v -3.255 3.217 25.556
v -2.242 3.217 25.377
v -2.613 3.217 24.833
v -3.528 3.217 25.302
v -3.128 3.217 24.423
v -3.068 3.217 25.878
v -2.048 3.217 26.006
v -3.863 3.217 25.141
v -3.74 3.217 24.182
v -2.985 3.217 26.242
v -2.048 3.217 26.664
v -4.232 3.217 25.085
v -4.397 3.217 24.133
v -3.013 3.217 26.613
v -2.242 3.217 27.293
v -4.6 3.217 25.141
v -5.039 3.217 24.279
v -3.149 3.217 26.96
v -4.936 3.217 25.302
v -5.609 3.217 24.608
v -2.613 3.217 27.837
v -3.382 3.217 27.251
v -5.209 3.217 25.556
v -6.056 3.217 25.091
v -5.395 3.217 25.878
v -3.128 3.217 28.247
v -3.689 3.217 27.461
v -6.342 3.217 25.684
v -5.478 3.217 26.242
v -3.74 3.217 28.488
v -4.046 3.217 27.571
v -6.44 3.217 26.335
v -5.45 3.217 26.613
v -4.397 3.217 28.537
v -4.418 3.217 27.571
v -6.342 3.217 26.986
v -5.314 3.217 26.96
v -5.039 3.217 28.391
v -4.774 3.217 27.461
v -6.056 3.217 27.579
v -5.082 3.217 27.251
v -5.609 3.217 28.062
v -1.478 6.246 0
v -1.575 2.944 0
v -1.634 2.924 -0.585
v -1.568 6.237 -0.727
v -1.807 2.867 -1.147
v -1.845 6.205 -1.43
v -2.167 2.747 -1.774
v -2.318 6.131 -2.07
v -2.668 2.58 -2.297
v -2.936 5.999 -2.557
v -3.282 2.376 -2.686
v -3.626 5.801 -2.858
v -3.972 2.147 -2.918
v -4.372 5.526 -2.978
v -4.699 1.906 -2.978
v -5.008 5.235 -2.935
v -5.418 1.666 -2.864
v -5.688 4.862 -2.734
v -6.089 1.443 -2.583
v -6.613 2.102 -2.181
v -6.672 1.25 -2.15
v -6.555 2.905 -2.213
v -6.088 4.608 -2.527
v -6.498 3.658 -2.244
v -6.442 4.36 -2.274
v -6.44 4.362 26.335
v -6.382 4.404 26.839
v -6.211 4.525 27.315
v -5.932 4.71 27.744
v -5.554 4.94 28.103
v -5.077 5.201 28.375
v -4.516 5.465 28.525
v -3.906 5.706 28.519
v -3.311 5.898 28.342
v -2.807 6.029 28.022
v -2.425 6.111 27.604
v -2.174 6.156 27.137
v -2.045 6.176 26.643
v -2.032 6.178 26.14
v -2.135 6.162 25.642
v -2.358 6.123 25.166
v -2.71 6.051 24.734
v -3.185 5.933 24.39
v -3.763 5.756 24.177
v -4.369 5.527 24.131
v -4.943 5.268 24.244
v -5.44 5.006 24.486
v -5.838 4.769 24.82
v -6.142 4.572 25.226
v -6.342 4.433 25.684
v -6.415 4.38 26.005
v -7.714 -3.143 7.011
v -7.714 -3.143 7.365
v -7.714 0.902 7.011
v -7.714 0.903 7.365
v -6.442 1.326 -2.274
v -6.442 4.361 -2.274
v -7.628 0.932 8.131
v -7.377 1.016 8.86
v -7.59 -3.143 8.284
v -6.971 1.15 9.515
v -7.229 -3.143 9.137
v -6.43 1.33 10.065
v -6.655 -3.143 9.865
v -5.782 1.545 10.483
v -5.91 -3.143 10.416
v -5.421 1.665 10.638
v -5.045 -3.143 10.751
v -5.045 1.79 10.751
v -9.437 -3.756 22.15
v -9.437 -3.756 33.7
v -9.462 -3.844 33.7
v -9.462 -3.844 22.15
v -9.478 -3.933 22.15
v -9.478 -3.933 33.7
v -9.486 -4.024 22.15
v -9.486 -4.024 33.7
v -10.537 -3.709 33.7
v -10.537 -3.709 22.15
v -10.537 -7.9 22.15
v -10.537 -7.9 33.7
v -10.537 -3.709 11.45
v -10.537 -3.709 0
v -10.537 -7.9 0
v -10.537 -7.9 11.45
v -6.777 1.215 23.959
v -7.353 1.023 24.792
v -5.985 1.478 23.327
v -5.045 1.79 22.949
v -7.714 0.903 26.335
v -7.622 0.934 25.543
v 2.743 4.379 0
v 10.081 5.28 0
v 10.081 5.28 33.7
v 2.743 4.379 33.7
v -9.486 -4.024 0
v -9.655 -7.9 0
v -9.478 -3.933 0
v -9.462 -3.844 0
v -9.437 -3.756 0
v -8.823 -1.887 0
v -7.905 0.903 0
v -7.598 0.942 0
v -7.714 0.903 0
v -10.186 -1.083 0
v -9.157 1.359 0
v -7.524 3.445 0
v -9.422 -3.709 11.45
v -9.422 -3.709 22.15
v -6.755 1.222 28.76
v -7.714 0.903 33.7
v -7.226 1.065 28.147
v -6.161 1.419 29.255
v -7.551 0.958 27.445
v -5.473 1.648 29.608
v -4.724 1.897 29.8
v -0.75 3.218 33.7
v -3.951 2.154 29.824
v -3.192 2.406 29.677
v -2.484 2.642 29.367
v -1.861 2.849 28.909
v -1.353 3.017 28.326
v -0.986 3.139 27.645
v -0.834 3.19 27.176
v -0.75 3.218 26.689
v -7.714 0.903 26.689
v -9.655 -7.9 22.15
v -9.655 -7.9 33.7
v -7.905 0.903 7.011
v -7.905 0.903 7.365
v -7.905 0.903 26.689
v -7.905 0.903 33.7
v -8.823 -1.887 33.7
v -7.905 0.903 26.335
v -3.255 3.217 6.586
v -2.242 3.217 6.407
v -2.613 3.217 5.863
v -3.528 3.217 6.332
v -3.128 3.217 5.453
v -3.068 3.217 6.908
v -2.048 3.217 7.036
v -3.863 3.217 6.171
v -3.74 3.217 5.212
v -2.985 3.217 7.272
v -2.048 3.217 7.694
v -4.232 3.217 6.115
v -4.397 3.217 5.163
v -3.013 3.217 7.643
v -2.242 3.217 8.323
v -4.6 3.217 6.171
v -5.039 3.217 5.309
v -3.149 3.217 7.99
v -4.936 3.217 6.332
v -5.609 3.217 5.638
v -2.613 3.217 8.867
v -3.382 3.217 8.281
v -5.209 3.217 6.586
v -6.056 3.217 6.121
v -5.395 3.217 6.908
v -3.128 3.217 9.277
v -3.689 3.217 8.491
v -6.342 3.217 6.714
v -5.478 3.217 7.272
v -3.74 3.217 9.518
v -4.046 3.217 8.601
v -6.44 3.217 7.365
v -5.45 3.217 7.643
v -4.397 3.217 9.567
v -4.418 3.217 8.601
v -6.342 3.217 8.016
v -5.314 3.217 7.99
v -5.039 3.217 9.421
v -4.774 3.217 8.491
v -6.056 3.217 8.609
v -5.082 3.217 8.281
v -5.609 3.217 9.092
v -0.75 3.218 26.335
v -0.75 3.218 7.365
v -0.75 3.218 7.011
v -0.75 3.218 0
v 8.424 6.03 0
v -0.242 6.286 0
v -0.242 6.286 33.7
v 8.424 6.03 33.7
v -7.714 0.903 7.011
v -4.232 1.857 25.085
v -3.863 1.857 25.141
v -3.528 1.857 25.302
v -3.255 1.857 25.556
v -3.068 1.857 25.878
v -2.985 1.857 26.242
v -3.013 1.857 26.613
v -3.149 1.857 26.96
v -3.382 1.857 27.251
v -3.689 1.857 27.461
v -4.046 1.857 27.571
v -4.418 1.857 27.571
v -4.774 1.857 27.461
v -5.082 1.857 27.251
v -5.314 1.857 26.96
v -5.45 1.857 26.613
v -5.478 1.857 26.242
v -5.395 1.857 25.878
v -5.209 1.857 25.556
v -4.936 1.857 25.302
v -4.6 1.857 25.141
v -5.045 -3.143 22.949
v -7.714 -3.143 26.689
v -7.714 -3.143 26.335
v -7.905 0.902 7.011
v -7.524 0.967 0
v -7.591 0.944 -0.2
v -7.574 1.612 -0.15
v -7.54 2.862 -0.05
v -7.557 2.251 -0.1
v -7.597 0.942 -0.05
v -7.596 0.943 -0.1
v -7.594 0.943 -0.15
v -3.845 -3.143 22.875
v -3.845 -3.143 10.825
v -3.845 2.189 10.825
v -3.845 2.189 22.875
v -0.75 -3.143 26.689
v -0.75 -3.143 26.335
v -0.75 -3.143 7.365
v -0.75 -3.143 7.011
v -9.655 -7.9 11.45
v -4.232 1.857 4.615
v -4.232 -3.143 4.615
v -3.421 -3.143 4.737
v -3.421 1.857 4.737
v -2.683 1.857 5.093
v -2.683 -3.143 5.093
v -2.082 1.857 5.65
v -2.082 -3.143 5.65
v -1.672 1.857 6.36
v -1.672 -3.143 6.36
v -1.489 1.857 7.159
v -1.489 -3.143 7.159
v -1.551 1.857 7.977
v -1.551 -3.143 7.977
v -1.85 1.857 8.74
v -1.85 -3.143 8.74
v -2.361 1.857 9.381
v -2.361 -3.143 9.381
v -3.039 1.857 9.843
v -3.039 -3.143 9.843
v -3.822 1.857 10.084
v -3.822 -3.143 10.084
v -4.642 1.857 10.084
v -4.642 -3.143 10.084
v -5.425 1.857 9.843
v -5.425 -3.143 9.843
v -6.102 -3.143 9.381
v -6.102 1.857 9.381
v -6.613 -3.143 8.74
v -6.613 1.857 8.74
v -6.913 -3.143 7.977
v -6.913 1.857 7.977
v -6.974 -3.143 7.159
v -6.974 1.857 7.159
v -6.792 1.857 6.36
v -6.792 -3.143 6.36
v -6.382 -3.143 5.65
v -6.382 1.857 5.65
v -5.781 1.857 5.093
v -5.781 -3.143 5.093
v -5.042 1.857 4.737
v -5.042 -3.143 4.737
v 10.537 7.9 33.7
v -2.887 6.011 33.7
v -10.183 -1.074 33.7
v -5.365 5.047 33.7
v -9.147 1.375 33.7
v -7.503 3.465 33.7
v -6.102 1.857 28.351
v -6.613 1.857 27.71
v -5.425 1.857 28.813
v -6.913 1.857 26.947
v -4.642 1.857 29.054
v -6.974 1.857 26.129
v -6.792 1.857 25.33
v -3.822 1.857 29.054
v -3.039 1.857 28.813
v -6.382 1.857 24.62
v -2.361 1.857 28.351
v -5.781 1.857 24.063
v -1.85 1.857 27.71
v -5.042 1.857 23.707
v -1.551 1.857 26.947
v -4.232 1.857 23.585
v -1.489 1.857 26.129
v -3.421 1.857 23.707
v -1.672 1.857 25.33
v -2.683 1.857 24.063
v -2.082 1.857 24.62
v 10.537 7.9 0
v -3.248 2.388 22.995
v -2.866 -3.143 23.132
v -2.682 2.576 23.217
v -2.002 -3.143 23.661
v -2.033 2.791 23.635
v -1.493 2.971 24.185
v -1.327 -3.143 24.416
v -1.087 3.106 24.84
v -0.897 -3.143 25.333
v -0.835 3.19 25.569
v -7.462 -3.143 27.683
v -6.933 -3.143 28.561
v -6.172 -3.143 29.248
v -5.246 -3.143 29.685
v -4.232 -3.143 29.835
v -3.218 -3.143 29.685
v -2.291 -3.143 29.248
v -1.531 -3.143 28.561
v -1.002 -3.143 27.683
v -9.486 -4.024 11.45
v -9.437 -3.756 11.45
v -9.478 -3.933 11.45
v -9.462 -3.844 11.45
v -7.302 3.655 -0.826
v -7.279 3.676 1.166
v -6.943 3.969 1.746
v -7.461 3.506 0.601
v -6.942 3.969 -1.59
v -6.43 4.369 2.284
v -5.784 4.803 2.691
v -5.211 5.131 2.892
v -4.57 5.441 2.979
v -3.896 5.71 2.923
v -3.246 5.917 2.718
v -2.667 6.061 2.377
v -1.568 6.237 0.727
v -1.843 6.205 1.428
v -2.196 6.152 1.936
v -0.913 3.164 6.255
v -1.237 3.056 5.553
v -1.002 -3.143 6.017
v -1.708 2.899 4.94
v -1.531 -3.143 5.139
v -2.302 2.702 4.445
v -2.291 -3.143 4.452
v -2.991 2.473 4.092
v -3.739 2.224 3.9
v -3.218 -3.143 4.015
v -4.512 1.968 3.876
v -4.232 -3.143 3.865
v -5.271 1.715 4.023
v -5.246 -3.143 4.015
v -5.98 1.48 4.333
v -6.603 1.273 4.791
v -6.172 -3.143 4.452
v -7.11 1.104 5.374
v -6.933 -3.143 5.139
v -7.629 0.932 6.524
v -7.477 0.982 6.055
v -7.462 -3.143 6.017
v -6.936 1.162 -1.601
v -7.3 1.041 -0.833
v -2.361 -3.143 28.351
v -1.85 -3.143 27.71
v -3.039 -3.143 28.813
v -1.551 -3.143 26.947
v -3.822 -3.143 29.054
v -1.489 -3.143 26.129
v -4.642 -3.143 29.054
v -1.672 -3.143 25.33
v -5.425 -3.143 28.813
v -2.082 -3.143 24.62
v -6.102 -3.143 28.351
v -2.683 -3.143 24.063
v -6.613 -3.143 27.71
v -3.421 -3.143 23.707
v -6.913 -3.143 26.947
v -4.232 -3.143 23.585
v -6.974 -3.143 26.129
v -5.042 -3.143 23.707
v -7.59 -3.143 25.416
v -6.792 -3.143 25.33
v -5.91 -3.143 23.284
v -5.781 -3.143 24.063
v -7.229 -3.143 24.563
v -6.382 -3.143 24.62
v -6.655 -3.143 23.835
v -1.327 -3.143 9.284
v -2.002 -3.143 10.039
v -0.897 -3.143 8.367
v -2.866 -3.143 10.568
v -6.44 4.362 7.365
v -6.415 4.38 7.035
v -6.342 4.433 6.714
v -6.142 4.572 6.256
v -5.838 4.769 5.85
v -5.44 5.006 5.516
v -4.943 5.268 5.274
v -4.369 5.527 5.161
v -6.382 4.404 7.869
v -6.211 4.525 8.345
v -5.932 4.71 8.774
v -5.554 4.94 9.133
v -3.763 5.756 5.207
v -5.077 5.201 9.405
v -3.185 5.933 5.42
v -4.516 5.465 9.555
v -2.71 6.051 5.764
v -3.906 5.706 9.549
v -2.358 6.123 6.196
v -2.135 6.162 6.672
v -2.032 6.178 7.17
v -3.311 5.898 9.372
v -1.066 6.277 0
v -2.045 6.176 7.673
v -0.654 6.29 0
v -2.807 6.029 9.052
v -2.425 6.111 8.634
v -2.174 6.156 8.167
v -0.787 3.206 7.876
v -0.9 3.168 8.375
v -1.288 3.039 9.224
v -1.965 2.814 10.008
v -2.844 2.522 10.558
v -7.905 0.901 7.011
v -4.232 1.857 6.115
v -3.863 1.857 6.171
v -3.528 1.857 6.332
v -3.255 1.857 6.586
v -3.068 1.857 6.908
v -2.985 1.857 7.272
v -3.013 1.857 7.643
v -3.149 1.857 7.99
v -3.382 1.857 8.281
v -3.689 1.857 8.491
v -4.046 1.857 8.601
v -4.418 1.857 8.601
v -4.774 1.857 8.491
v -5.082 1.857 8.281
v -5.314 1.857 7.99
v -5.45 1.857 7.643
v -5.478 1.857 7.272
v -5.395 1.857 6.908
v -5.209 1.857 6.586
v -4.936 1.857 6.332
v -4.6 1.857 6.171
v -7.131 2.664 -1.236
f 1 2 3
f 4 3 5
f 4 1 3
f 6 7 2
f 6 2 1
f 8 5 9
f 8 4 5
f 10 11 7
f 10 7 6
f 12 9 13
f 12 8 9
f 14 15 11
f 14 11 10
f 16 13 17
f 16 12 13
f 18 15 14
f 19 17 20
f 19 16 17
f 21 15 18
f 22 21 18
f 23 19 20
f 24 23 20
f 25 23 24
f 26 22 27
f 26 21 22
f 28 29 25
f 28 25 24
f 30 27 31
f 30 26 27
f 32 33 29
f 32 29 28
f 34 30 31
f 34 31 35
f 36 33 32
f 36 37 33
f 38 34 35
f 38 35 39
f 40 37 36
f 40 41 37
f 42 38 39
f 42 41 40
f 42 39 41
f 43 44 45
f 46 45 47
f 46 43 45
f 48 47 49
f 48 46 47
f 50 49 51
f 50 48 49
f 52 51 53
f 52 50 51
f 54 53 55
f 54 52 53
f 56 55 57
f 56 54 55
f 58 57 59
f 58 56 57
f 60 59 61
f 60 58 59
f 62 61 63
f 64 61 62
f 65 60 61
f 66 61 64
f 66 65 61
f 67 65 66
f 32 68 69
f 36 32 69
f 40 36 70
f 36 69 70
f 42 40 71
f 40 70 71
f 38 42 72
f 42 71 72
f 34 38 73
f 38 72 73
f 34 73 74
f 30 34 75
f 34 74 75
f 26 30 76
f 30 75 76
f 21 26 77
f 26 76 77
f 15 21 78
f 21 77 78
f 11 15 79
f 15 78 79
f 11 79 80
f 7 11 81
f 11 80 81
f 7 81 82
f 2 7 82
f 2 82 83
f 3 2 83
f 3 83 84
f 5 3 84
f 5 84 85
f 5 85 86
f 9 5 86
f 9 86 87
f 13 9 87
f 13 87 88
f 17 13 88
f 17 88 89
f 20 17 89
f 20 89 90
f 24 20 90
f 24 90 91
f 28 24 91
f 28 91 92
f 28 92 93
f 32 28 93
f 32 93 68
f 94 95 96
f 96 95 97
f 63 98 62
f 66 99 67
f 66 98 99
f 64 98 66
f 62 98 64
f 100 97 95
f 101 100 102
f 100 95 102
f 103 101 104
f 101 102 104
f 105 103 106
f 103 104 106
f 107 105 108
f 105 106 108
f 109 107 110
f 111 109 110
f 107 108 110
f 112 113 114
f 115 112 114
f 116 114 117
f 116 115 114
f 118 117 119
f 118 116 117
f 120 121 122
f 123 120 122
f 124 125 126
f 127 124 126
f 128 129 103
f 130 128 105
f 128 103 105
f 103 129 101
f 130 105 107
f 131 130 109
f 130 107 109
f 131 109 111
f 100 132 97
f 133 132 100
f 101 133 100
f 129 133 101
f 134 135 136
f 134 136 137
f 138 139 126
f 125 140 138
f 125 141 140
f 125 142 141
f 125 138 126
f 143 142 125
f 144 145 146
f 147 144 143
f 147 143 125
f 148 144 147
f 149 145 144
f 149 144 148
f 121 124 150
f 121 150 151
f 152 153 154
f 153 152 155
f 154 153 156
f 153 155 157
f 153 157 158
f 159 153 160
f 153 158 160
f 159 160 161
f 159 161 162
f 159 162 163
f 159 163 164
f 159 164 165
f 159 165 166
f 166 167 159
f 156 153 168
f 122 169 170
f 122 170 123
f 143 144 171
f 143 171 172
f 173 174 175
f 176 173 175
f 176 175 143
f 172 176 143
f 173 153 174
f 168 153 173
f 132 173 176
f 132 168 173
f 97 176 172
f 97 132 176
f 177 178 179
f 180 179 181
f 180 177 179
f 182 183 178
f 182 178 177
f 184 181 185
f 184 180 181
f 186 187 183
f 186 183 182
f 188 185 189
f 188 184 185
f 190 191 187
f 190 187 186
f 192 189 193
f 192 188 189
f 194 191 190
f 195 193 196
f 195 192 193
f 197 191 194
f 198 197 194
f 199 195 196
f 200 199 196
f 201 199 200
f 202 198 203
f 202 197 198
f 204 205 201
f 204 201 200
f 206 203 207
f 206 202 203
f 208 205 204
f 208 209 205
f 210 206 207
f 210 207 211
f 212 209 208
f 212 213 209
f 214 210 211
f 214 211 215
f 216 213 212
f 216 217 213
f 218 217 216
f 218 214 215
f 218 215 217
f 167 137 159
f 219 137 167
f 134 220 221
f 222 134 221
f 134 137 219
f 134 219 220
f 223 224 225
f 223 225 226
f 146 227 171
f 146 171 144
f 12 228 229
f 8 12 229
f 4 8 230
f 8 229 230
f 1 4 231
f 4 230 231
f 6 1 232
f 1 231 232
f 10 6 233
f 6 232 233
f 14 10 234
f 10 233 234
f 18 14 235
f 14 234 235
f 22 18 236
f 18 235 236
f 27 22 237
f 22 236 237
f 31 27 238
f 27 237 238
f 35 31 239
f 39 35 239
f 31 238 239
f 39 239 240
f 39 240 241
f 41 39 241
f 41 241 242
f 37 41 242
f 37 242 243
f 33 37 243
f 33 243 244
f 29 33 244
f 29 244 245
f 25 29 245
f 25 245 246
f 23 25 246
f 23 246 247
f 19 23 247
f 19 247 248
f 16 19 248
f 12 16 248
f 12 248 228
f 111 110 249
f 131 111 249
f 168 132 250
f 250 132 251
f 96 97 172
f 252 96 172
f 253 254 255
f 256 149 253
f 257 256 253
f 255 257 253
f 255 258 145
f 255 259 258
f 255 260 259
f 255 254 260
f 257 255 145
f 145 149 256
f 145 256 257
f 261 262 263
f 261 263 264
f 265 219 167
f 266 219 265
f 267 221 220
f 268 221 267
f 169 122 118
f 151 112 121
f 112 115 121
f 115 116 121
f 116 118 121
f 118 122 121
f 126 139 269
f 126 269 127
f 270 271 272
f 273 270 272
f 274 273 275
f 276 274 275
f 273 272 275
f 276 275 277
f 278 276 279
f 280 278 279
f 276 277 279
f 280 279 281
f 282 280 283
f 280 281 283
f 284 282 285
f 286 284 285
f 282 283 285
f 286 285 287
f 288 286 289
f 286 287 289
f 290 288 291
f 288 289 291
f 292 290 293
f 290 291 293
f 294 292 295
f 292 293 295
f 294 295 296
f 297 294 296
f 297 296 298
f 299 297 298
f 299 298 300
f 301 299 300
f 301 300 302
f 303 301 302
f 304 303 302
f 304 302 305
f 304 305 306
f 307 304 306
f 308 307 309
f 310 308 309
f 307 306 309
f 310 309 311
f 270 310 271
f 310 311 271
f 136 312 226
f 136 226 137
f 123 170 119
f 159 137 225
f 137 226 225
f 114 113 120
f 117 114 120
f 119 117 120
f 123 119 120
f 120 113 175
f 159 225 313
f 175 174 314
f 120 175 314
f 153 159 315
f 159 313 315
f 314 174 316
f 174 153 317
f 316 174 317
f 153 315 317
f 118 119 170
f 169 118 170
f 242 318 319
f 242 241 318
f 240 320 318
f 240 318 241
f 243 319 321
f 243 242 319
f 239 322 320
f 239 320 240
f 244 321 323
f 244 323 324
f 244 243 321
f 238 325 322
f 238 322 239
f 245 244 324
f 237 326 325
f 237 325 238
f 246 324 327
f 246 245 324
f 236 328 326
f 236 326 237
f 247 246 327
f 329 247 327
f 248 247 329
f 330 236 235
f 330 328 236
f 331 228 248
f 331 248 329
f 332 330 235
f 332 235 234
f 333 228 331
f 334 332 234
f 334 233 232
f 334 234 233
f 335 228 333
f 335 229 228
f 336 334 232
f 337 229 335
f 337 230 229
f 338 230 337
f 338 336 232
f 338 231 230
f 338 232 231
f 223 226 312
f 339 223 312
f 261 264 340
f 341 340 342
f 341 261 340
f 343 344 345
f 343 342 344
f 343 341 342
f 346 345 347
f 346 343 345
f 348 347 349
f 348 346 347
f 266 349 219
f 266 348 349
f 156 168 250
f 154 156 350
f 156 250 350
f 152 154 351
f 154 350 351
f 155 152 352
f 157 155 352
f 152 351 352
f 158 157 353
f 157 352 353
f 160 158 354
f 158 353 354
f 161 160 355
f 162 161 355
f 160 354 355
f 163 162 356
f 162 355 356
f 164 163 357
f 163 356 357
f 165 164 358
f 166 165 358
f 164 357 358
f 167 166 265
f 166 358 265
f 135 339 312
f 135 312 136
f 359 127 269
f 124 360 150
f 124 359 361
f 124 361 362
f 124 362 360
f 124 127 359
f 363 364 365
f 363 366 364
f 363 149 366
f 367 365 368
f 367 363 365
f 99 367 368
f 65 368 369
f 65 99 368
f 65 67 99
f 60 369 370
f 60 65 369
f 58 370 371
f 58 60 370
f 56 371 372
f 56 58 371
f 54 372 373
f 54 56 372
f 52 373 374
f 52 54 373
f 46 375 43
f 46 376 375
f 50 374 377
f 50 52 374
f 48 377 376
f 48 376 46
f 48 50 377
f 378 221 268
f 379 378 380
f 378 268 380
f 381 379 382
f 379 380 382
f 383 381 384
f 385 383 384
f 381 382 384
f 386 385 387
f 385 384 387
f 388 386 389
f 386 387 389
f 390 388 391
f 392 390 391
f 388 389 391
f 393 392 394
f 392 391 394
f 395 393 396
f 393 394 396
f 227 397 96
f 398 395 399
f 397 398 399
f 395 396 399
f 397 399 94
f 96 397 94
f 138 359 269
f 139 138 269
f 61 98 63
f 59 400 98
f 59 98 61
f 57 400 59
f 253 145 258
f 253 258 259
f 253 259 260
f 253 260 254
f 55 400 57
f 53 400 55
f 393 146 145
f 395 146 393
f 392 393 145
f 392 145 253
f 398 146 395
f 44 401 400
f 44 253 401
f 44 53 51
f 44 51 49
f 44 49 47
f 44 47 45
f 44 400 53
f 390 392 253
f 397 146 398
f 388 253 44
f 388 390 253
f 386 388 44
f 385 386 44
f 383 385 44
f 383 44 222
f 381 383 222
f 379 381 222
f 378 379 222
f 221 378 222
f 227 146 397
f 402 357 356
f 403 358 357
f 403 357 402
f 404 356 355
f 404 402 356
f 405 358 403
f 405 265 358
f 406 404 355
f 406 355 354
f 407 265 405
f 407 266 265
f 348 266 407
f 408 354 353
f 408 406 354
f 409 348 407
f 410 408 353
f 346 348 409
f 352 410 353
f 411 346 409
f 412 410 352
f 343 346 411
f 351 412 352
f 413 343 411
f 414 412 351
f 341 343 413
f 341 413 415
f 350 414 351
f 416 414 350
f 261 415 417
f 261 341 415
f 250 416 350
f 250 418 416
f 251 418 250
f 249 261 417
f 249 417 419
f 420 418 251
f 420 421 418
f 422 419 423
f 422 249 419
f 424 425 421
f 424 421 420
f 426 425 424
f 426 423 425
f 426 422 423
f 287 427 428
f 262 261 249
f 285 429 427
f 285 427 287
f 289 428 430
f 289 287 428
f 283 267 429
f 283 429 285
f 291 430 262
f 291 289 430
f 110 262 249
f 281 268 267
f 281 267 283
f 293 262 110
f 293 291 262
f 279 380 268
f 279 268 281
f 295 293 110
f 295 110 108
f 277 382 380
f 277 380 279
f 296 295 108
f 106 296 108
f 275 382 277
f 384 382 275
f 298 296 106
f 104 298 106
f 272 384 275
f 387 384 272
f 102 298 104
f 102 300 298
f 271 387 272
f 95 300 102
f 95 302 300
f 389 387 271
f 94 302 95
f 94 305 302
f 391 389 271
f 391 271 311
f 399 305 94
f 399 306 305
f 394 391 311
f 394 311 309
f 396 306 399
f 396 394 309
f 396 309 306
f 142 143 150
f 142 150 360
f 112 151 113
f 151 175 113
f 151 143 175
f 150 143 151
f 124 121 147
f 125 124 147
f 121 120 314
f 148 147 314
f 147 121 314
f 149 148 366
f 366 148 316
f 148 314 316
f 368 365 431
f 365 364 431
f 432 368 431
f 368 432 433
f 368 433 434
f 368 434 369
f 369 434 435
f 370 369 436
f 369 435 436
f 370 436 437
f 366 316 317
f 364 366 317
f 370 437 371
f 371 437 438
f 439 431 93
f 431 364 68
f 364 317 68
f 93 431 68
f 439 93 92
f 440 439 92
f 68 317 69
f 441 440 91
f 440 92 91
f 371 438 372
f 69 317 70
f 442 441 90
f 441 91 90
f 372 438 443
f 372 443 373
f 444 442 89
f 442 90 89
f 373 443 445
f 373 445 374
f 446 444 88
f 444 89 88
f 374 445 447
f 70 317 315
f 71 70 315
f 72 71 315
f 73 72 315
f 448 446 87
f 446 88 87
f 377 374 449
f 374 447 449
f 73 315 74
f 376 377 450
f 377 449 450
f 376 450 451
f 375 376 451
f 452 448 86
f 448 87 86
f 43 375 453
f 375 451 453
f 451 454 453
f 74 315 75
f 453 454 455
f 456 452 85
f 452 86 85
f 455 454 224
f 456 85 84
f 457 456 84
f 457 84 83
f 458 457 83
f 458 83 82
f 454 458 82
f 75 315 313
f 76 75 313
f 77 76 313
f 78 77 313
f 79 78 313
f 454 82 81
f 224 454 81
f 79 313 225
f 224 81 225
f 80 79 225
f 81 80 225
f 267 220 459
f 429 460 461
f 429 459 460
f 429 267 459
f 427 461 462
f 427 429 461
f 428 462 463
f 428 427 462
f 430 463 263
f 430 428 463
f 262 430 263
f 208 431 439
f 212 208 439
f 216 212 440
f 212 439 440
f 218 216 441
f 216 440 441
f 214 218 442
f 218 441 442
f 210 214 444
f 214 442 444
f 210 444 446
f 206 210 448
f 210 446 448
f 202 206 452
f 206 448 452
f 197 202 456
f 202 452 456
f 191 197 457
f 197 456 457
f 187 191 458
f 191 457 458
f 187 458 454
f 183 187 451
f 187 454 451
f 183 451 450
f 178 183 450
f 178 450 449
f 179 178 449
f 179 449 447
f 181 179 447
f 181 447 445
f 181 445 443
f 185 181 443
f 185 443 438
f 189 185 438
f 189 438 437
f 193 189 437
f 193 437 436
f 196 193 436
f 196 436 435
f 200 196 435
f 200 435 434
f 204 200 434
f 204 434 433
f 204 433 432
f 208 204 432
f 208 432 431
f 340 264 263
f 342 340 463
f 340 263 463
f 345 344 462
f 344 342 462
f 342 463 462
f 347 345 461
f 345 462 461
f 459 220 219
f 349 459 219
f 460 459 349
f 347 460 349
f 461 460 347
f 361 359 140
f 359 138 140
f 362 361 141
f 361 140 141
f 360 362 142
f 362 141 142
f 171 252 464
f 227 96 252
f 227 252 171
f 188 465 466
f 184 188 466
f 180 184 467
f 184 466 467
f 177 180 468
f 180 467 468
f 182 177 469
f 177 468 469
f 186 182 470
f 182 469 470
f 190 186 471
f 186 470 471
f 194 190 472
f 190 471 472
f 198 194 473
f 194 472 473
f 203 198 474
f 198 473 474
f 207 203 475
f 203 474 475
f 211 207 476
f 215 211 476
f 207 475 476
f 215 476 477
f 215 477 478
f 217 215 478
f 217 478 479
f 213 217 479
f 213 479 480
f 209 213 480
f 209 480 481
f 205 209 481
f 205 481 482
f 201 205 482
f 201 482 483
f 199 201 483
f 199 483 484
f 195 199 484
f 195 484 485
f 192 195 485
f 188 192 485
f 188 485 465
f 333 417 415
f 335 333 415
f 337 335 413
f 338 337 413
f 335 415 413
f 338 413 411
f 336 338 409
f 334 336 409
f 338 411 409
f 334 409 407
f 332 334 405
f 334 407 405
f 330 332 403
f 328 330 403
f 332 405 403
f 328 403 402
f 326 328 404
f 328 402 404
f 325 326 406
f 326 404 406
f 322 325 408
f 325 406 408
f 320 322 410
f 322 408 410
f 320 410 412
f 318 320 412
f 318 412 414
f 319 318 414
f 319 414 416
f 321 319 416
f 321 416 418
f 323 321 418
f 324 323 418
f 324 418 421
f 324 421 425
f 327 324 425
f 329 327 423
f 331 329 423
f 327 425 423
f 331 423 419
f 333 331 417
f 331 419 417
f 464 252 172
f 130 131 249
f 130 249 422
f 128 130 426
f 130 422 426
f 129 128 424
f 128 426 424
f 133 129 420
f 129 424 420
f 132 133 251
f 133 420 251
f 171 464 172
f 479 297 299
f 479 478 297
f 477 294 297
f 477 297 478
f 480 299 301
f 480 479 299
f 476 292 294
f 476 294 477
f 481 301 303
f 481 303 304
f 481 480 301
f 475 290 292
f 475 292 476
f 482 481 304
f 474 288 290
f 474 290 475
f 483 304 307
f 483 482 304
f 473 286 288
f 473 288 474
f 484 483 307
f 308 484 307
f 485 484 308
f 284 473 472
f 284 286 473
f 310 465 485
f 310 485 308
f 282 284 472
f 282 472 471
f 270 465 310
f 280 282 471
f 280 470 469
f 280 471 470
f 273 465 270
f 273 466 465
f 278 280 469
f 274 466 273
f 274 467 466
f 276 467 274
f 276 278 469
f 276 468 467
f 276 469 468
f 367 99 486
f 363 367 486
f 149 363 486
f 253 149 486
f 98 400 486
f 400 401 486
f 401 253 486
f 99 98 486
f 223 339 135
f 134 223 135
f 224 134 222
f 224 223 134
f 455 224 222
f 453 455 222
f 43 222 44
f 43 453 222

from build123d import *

# Parameters (mm, degrees)
BOSS_EXTRUDE1_DEPTH      = 33.7
FILLET1_R                = 20
FILLET2_R                = 10
CUT_EXTRUDE1_REACH       = 42.524
CUT_EXTRUDE1_END_RADIUS  = 20
SKETCH18_W               = 10.7
SKETCH18_H               = 4.190618397
CUT_EXTRUDE2_REACH       = 38.996
CUT_EXTRUDE3_REACH       = 38.996
CUT_EXTRUDE4_REACH       = 41.13
CUT_EXTRUDE5_REACH       = 41.13
CUT_EXTRUDE6_REACH       = 41.13
SKETCH37_W               = 7.010527041
SKETCH37_H               = 4.046754886
CUT_EXTRUDE7_DEPTH       = 30.450302171
CUT_EXTRUDE8_DEPTH       = 10
SKETCH40_R               = 1.25
CUT_EXTRUDE9_DEPTH       = 37.995504756
SKETCH41_R               = 2.75
CUT_EXTRUDE10_DEPTH      = 5
SKETCH42_R               = 2.208277428
CUT_EXTRUDE11_DEPTH      = 3
CUT_EXTRUDE12_DEPTH      = 37.18178953
FILLET3_R                = 1
BOSS_EXTRUDE2_REACH      = 40.099
SKETCH44_R               = 2.980312175
CUT_EXTRUDE13_REACH      = 40.099
CUT_EXTRUDE13_END_RADIUS = 10
SKETCH46_R               = 2.980312175
CUT_EXTRUDE14_REACH      = 40.026


with BuildPart() as part:
    # Sketch17 → Boss-Extrude1 (new body)
    with BuildSketch(Plane.XY):
        Polygon((10.53663492, 7.900076539), (10.081415975, 5.280038612), (2.74336508, 4.379039255), (-0.749806064, 3.218028635), (-0.749806064, -3.143324057), (-7.713813222, -3.143324057), (-8.111536279, 0.095870306), (-9.33663492, -4.700076539), (-9.33663492, -7.900076539), (-10.53663492, -7.900076539), (-10.53663492, -3.500076539), (-10.53663492, 6.590057575), (8.423934133, 6.030416141), align=None)
    extrude(amount=BOSS_EXTRUDE1_DEPTH)

    # Fillet1
    fillet1_edges = [part.edges().sort_by_distance(p)[0] for p in [
        (-9.33663492, -4.700076539, 16.85),
    ]]
    fillet(fillet1_edges, radius=FILLET1_R)

    # Fillet2
    fillet2_edges = [part.edges().sort_by_distance(p)[0] for p in [
        (-10.53663492, 6.590057575, 16.85),
    ]]
    fillet(fillet2_edges, radius=FILLET2_R)

    # Cut-Extrude1: up to this cylinder (the profile starts outside it)
    cut_extrude1_end = Plane(origin=(10.66336508, -7.214158247, 16.8), z_dir=(0, 0, 1)) * Cylinder(CUT_EXTRUDE1_END_RADIUS, 126.048, mode=Mode.PRIVATE)
    # Sketch18 → Cut-Extrude1 (cut, up to the surface)
    with BuildSketch(Plane.ZY.offset(10.53663492), mode=Mode.PRIVATE) as cut_extrude1_sk1:
        with Locations((16.8, -5.804767341)):
            Rectangle(SKETCH18_W, SKETCH18_H)
    cut_extrude1_tool1 = extrude(cut_extrude1_sk1.sketch, amount=-CUT_EXTRUDE1_REACH, mode=Mode.PRIVATE) - cut_extrude1_end
    add(cut_extrude1_tool1.solids().sort_by_distance((-10.536635, -5.804767, 16.8))[0], mode=Mode.SUBTRACT)

    # Cut-Extrude2: up to this plane
    cut_extrude2_end = Plane(origin=(2.74336508, 4.379039255, 33.7), z_dir=(-0.3154013115740007, 0.9489583829954822, 0))
    # Sketch32 → Cut-Extrude2 (cut, up to the surface)
    with BuildSketch(Plane.XZ.offset(3.143324057), mode=Mode.PRIVATE) as cut_extrude2_sk1:
        with BuildLine():
            Line((-0.749806064, 33.7), (-7.713813222, 33.7))
            Line((-7.713813222, 33.7), (-7.713813222, 26.689472959))
            ThreePointArc((-7.713813222, 26.689472959), (-4.231809642, 29.835), (-0.749806064, 26.689472956))
            Line((-0.749806064, 26.689472956), (-0.749806064, 33.7))
        make_face()
    cut_extrude2_tool1 = split(extrude(cut_extrude2_sk1.sketch, amount=-CUT_EXTRUDE2_REACH, mode=Mode.PRIVATE), bisect_by=cut_extrude2_end, keep=Keep.BOTH, mode=Mode.PRIVATE)
    add(cut_extrude2_tool1.solids().sort_by_distance((-4.23181, -3.143324, 31.335376))[0], mode=Mode.SUBTRACT)
    # Sketch32 → Cut-Extrude2 (cut, up to the surface)
    with BuildSketch(Plane.XZ.offset(3.143324057), mode=Mode.PRIVATE) as cut_extrude2_sk2:
        with BuildLine():
            ThreePointArc((-0.749806064, 7.010527044), (-4.231809642, 3.865), (-7.713813222, 7.010527041))
            Line((-7.713813222, 7.010527041), (-7.713813222, 0))
            Line((-7.713813222, 0), (-0.749806064, 0))
            Line((-0.749806064, 0), (-0.749806064, 7.010527044))
        make_face()
    cut_extrude2_tool2 = split(extrude(cut_extrude2_sk2.sketch, amount=-CUT_EXTRUDE2_REACH, mode=Mode.PRIVATE), bisect_by=cut_extrude2_end, keep=Keep.BOTH, mode=Mode.PRIVATE)
    add(cut_extrude2_tool2.solids().sort_by_distance((-4.23181, -3.143324, 2.364624))[0], mode=Mode.SUBTRACT)

    # Cut-Extrude3: up to this plane
    cut_extrude3_end = Plane(origin=(2.74336508, 4.379039255, 33.7), z_dir=(-0.3154013115740007, 0.9489583829954822, 0))
    # Sketch33 → Cut-Extrude3 (cut, up to the surface)
    with BuildSketch(Plane.XZ.offset(3.143324057), mode=Mode.PRIVATE) as cut_extrude3_sk1:
        with BuildLine():
            Line((-0.749806064, 26.335), (-0.749806064, 7.365))
            ThreePointArc((-0.749806064, 7.365), (-1.636617826, 9.6864927), (-3.845338986, 10.825489756))
            Line((-3.845338986, 10.825489756), (-3.845338986, 22.874510244))
            ThreePointArc((-3.845338986, 22.874510244), (-1.636617826, 24.0135073), (-0.749806064, 26.335))
        make_face()
    cut_extrude3_tool1 = split(extrude(cut_extrude3_sk1.sketch, amount=-CUT_EXTRUDE3_REACH, mode=Mode.PRIVATE), bisect_by=cut_extrude3_end, keep=Keep.BOTH, mode=Mode.PRIVATE)
    add(cut_extrude3_tool1.solids().sort_by_distance((-2.202773, -3.143324, 16.85))[0], mode=Mode.SUBTRACT)
    # Sketch33 → Cut-Extrude3 (cut, up to the surface)
    with BuildSketch(Plane.XZ.offset(3.143324057), mode=Mode.PRIVATE) as cut_extrude3_sk2:
        with BuildLine():
            Line((-7.713813222, 26.335), (-7.713813222, 7.365))
            ThreePointArc((-7.713813222, 7.365), (-6.966499846, 9.520416066), (-5.045338986, 10.750634199))
            Line((-5.045338986, 10.750634199), (-5.045338986, 22.916214753))
            Line((-5.045338986, 22.916214753), (-5.045338986, 22.949365801))
            ThreePointArc((-5.045338986, 22.949365801), (-6.966499846, 24.179583934), (-7.713813222, 26.335))
        make_face()
    cut_extrude3_tool2 = split(extrude(cut_extrude3_sk2.sketch, amount=-CUT_EXTRUDE3_REACH, mode=Mode.PRIVATE), bisect_by=cut_extrude3_end, keep=Keep.BOTH, mode=Mode.PRIVATE)
    add(cut_extrude3_tool2.solids().sort_by_distance((-6.459589, -3.143324, 16.85))[0], mode=Mode.SUBTRACT)

    # Cut-Extrude4: up to this plane
    cut_extrude4_end = Plane(origin=(-8.111536279, 0.095870306, 33.7), z_dir=(-0.9688885735577917, 0.2474973374182996, 0))
    # Sketch35 → Cut-Extrude4 (cut, up to the surface)
    with BuildSketch(Plane(origin=(-7.713813222, 0, 0), x_dir=(0, 0, -1), z_dir=(1, 0, 0)), mode=Mode.PRIVATE) as cut_extrude4_sk1:
        Polygon((-33.7, 0.903430829), (-26.689472959, 0.903430829), (-26.51223648, -3.143324057), (-33.7, -3.143324057), align=None)
    cut_extrude4_tool1 = split(extrude(cut_extrude4_sk1.sketch, amount=-CUT_EXTRUDE4_REACH, mode=Mode.PRIVATE), bisect_by=cut_extrude4_end, keep=Keep.BOTH, mode=Mode.PRIVATE)
    add(cut_extrude4_tool1.solids().sort_by_distance((-7.713813, -1.128366, 30.150243))[0], mode=Mode.SUBTRACT)

    # Cut-Extrude5: up to this plane
    cut_extrude5_end = Plane(origin=(-8.111536279, 0.095870306, 33.7), z_dir=(-0.9688885735577917, 0.2474973374182996, 0))
    # Sketch36 → Cut-Extrude5 (cut, up to the surface)
    with BuildSketch(Plane(origin=(-7.713813222, 0, 0), x_dir=(0, 0, -1), z_dir=(1, 0, 0)), mode=Mode.PRIVATE) as cut_extrude5_sk1:
        Polygon((-7.385460395, -3.179256499), (-26.335, -3.143324057), (-26.335, 0.903430829), (-7.365, 0.903430829), align=None)
    cut_extrude5_tool1 = split(extrude(cut_extrude5_sk1.sketch, amount=-CUT_EXTRUDE5_REACH, mode=Mode.PRIVATE), bisect_by=cut_extrude5_end, keep=Keep.BOTH, mode=Mode.PRIVATE)
    add(cut_extrude5_tool1.solids().sort_by_distance((-7.713813, -1.128579, 16.84114))[0], mode=Mode.SUBTRACT)

    # Cut-Extrude6: up to this plane
    cut_extrude6_end = Plane(origin=(-8.111536279, 0.095870306, 33.7), z_dir=(-0.9688885735577917, 0.2474973374182996, 0))
    # Sketch37 → Cut-Extrude6 (cut, up to the surface)
    with BuildSketch(Plane(origin=(-7.713813222, 0, 0), x_dir=(0, 0, -1), z_dir=(1, 0, 0)), mode=Mode.PRIVATE) as cut_extrude6_sk1:
        with Locations((-3.505263521, -1.119946614)):
            Rectangle(SKETCH37_W, SKETCH37_H)
    cut_extrude6_tool1 = split(extrude(cut_extrude6_sk1.sketch, amount=-CUT_EXTRUDE6_REACH, mode=Mode.PRIVATE), bisect_by=cut_extrude6_end, keep=Keep.BOTH, mode=Mode.PRIVATE)
    add(cut_extrude6_tool1.solids().sort_by_distance((-7.713813, -1.119947, 3.505264))[0], mode=Mode.SUBTRACT)

    # Sketch38 → Cut-Extrude7 (cut, through all)
    with BuildSketch(Plane(origin=(0, 0.036931473, 7.369342463), x_dir=(1, 0, 0), z_dir=(0, 0.005011438902896351, 0.999987442661218))):
        Polygon((-7.713813222, 0.866510236), (-7.905249318, 0.866510236), (-8.111536279, 0.058939572), (-7.713813222, -3.180295466), align=None)
    extrude(amount=-CUT_EXTRUDE7_DEPTH, mode=Mode.SUBTRACT)

    # Sketch39 → Cut-Extrude8 (cut)
    with BuildSketch(Plane(origin=(0, 0, 26.335), x_dir=(-1, 0, 0), z_dir=(0, 0, -1))):
        Polygon((7.905249318, 0.903430829), (7.713813222, 0.903430829), (7.713813222, -3.143324057), (8.111536279, 0.095870306), align=None)
    extrude(amount=-CUT_EXTRUDE8_DEPTH, mode=Mode.SUBTRACT)

    # Sketch40 → Cut-Extrude9 (cut, through all)
    with BuildSketch(Plane.XZ.offset(3.143324057)):
        with Locations((-4.231809643, 7.365)):
            Circle(SKETCH40_R)
        with Locations((-4.231809643, 26.335)):
            Circle(SKETCH40_R)
    extrude(amount=-CUT_EXTRUDE9_DEPTH, mode=Mode.SUBTRACT)

    # Sketch41 → Cut-Extrude10 (cut)
    with BuildSketch(Plane.XZ.offset(3.143324057)):
        with Locations((-4.231809643, 26.335)):
            Circle(SKETCH41_R)
        with Locations((-4.231809643, 7.365)):
            Circle(SKETCH41_R)
    extrude(amount=-CUT_EXTRUDE10_DEPTH, mode=Mode.SUBTRACT)

    # Sketch42 → Cut-Extrude11 (cut)
    with BuildSketch(Plane.ZX.offset(6.217374095)):
        with Locations((7.365, -4.231809643)):
            Circle(SKETCH42_R)
        with Locations((26.335, -4.231809643)):
            Circle(SKETCH42_R)
    extrude(amount=-CUT_EXTRUDE11_DEPTH, mode=Mode.SUBTRACT)

    # Sketch43 → Cut-Extrude12 (cut, through all)
    with BuildSketch(Plane.XY.offset(33.7)):
        Polygon((-7.905249318, 0.903430829), (-8.822914385, -1.887149193), (-9.480427728, -3.886619005), (-9.654860317, -7.900076539), (-8.364081852, -7.900076539), align=None)
    extrude(amount=-CUT_EXTRUDE12_DEPTH, mode=Mode.SUBTRACT)

    # Fillet3
    fillet3_edges = [part.edges().sort_by_distance(p)[0] for p in [
        (-9.480427728, -3.886619005, 5.725),
        (-9.480427728, -3.886619005, 27.925),
    ]]
    fillet(fillet3_edges, radius=FILLET3_R)

    # Boss-Extrude2: up to this plane
    boss_extrude2_end = Plane(origin=(2.74336508, 4.379039255, 33.7), z_dir=(-0.3154013115740007, 0.9489583829954822, 0))
    # Sketch44 → Boss-Extrude2 (add, up to the surface)
    with BuildSketch(Plane(origin=(0.185171765, 6.273592006, 0), x_dir=(0.999564685295442, -0.029503218641770287, 0), z_dir=(0.029503218641770287, 0.999564685295442, 0)), mode=Mode.PRIVATE) as boss_extrude2_sk1:
        with Locations((-4.641678191, 0)):
            Circle(SKETCH44_R)
    boss_extrude2_tool1 = split(extrude(boss_extrude2_sk1.sketch, amount=-BOSS_EXTRUDE2_REACH, mode=Mode.PRIVATE), bisect_by=boss_extrude2_end, keep=Keep.BOTH, mode=Mode.PRIVATE)
    add(boss_extrude2_tool1.solids().sort_by_distance((-4.454486, 6.410536, 0))[0])

    # Cut-Extrude13: up to this cylinder (the profile starts outside it)
    cut_extrude13_end = Plane(origin=(-0.53663492, -3.709458142, 0), z_dir=(0, 0, -1)) * Cylinder(CUT_EXTRUDE13_END_RADIUS, 101.198, mode=Mode.PRIVATE)
    # Sketch46 → Cut-Extrude13 (cut, up to the surface)
    with BuildSketch(Plane(origin=(0.185171765, 6.273592006, 0), x_dir=(0.999564685295442, -0.029503218641770287, 0), z_dir=(0.029503218641770287, 0.999564685295442, 0)), mode=Mode.PRIVATE) as cut_extrude13_sk1:
        with Locations((-4.641678191, 0)):
            Circle(SKETCH46_R)
    cut_extrude13_tool1 = extrude(cut_extrude13_sk1.sketch, amount=-CUT_EXTRUDE13_REACH, mode=Mode.PRIVATE) - cut_extrude13_end
    add(cut_extrude13_tool1.solids().sort_by_distance((-4.454486, 6.410536, 0))[0], mode=Mode.SUBTRACT)

    # Cut-Extrude14: up to this plane
    cut_extrude14_end = Plane(origin=(2.74336508, 4.379039255, 33.7), z_dir=(-0.3154013115740007, 0.9489583829954822, 0))
    # Sketch47 → Cut-Extrude14 (cut, up to the surface)
    with BuildSketch(Plane.ZX.offset(6.217374095), mode=Mode.PRIVATE) as cut_extrude14_sk1:
        with BuildLine():
            Line((-2.274089727, -6.442110298), (-1.428952647, -8.002768724))
            Line((-1.428952647, -8.002768724), (0, -7.523636117))
            add(Edge.make_bspline(
                [(0, -7.523636117), (-1.334083286, -7.279775766), (-2.274089727, -6.442110298)],
                knots=[0, 0, 0, 1, 1, 1], degree=2))
        make_face()
    cut_extrude14_tool1 = split(extrude(cut_extrude14_sk1.sketch, amount=-CUT_EXTRUDE14_REACH, mode=Mode.PRIVATE), bisect_by=cut_extrude14_end, keep=Keep.BOTH, mode=Mode.PRIVATE)
    add(cut_extrude14_tool1.solids().sort_by_distance((-7.404175, 6.217374, -1.25113))[0], mode=Mode.SUBTRACT)


solid = part.part
